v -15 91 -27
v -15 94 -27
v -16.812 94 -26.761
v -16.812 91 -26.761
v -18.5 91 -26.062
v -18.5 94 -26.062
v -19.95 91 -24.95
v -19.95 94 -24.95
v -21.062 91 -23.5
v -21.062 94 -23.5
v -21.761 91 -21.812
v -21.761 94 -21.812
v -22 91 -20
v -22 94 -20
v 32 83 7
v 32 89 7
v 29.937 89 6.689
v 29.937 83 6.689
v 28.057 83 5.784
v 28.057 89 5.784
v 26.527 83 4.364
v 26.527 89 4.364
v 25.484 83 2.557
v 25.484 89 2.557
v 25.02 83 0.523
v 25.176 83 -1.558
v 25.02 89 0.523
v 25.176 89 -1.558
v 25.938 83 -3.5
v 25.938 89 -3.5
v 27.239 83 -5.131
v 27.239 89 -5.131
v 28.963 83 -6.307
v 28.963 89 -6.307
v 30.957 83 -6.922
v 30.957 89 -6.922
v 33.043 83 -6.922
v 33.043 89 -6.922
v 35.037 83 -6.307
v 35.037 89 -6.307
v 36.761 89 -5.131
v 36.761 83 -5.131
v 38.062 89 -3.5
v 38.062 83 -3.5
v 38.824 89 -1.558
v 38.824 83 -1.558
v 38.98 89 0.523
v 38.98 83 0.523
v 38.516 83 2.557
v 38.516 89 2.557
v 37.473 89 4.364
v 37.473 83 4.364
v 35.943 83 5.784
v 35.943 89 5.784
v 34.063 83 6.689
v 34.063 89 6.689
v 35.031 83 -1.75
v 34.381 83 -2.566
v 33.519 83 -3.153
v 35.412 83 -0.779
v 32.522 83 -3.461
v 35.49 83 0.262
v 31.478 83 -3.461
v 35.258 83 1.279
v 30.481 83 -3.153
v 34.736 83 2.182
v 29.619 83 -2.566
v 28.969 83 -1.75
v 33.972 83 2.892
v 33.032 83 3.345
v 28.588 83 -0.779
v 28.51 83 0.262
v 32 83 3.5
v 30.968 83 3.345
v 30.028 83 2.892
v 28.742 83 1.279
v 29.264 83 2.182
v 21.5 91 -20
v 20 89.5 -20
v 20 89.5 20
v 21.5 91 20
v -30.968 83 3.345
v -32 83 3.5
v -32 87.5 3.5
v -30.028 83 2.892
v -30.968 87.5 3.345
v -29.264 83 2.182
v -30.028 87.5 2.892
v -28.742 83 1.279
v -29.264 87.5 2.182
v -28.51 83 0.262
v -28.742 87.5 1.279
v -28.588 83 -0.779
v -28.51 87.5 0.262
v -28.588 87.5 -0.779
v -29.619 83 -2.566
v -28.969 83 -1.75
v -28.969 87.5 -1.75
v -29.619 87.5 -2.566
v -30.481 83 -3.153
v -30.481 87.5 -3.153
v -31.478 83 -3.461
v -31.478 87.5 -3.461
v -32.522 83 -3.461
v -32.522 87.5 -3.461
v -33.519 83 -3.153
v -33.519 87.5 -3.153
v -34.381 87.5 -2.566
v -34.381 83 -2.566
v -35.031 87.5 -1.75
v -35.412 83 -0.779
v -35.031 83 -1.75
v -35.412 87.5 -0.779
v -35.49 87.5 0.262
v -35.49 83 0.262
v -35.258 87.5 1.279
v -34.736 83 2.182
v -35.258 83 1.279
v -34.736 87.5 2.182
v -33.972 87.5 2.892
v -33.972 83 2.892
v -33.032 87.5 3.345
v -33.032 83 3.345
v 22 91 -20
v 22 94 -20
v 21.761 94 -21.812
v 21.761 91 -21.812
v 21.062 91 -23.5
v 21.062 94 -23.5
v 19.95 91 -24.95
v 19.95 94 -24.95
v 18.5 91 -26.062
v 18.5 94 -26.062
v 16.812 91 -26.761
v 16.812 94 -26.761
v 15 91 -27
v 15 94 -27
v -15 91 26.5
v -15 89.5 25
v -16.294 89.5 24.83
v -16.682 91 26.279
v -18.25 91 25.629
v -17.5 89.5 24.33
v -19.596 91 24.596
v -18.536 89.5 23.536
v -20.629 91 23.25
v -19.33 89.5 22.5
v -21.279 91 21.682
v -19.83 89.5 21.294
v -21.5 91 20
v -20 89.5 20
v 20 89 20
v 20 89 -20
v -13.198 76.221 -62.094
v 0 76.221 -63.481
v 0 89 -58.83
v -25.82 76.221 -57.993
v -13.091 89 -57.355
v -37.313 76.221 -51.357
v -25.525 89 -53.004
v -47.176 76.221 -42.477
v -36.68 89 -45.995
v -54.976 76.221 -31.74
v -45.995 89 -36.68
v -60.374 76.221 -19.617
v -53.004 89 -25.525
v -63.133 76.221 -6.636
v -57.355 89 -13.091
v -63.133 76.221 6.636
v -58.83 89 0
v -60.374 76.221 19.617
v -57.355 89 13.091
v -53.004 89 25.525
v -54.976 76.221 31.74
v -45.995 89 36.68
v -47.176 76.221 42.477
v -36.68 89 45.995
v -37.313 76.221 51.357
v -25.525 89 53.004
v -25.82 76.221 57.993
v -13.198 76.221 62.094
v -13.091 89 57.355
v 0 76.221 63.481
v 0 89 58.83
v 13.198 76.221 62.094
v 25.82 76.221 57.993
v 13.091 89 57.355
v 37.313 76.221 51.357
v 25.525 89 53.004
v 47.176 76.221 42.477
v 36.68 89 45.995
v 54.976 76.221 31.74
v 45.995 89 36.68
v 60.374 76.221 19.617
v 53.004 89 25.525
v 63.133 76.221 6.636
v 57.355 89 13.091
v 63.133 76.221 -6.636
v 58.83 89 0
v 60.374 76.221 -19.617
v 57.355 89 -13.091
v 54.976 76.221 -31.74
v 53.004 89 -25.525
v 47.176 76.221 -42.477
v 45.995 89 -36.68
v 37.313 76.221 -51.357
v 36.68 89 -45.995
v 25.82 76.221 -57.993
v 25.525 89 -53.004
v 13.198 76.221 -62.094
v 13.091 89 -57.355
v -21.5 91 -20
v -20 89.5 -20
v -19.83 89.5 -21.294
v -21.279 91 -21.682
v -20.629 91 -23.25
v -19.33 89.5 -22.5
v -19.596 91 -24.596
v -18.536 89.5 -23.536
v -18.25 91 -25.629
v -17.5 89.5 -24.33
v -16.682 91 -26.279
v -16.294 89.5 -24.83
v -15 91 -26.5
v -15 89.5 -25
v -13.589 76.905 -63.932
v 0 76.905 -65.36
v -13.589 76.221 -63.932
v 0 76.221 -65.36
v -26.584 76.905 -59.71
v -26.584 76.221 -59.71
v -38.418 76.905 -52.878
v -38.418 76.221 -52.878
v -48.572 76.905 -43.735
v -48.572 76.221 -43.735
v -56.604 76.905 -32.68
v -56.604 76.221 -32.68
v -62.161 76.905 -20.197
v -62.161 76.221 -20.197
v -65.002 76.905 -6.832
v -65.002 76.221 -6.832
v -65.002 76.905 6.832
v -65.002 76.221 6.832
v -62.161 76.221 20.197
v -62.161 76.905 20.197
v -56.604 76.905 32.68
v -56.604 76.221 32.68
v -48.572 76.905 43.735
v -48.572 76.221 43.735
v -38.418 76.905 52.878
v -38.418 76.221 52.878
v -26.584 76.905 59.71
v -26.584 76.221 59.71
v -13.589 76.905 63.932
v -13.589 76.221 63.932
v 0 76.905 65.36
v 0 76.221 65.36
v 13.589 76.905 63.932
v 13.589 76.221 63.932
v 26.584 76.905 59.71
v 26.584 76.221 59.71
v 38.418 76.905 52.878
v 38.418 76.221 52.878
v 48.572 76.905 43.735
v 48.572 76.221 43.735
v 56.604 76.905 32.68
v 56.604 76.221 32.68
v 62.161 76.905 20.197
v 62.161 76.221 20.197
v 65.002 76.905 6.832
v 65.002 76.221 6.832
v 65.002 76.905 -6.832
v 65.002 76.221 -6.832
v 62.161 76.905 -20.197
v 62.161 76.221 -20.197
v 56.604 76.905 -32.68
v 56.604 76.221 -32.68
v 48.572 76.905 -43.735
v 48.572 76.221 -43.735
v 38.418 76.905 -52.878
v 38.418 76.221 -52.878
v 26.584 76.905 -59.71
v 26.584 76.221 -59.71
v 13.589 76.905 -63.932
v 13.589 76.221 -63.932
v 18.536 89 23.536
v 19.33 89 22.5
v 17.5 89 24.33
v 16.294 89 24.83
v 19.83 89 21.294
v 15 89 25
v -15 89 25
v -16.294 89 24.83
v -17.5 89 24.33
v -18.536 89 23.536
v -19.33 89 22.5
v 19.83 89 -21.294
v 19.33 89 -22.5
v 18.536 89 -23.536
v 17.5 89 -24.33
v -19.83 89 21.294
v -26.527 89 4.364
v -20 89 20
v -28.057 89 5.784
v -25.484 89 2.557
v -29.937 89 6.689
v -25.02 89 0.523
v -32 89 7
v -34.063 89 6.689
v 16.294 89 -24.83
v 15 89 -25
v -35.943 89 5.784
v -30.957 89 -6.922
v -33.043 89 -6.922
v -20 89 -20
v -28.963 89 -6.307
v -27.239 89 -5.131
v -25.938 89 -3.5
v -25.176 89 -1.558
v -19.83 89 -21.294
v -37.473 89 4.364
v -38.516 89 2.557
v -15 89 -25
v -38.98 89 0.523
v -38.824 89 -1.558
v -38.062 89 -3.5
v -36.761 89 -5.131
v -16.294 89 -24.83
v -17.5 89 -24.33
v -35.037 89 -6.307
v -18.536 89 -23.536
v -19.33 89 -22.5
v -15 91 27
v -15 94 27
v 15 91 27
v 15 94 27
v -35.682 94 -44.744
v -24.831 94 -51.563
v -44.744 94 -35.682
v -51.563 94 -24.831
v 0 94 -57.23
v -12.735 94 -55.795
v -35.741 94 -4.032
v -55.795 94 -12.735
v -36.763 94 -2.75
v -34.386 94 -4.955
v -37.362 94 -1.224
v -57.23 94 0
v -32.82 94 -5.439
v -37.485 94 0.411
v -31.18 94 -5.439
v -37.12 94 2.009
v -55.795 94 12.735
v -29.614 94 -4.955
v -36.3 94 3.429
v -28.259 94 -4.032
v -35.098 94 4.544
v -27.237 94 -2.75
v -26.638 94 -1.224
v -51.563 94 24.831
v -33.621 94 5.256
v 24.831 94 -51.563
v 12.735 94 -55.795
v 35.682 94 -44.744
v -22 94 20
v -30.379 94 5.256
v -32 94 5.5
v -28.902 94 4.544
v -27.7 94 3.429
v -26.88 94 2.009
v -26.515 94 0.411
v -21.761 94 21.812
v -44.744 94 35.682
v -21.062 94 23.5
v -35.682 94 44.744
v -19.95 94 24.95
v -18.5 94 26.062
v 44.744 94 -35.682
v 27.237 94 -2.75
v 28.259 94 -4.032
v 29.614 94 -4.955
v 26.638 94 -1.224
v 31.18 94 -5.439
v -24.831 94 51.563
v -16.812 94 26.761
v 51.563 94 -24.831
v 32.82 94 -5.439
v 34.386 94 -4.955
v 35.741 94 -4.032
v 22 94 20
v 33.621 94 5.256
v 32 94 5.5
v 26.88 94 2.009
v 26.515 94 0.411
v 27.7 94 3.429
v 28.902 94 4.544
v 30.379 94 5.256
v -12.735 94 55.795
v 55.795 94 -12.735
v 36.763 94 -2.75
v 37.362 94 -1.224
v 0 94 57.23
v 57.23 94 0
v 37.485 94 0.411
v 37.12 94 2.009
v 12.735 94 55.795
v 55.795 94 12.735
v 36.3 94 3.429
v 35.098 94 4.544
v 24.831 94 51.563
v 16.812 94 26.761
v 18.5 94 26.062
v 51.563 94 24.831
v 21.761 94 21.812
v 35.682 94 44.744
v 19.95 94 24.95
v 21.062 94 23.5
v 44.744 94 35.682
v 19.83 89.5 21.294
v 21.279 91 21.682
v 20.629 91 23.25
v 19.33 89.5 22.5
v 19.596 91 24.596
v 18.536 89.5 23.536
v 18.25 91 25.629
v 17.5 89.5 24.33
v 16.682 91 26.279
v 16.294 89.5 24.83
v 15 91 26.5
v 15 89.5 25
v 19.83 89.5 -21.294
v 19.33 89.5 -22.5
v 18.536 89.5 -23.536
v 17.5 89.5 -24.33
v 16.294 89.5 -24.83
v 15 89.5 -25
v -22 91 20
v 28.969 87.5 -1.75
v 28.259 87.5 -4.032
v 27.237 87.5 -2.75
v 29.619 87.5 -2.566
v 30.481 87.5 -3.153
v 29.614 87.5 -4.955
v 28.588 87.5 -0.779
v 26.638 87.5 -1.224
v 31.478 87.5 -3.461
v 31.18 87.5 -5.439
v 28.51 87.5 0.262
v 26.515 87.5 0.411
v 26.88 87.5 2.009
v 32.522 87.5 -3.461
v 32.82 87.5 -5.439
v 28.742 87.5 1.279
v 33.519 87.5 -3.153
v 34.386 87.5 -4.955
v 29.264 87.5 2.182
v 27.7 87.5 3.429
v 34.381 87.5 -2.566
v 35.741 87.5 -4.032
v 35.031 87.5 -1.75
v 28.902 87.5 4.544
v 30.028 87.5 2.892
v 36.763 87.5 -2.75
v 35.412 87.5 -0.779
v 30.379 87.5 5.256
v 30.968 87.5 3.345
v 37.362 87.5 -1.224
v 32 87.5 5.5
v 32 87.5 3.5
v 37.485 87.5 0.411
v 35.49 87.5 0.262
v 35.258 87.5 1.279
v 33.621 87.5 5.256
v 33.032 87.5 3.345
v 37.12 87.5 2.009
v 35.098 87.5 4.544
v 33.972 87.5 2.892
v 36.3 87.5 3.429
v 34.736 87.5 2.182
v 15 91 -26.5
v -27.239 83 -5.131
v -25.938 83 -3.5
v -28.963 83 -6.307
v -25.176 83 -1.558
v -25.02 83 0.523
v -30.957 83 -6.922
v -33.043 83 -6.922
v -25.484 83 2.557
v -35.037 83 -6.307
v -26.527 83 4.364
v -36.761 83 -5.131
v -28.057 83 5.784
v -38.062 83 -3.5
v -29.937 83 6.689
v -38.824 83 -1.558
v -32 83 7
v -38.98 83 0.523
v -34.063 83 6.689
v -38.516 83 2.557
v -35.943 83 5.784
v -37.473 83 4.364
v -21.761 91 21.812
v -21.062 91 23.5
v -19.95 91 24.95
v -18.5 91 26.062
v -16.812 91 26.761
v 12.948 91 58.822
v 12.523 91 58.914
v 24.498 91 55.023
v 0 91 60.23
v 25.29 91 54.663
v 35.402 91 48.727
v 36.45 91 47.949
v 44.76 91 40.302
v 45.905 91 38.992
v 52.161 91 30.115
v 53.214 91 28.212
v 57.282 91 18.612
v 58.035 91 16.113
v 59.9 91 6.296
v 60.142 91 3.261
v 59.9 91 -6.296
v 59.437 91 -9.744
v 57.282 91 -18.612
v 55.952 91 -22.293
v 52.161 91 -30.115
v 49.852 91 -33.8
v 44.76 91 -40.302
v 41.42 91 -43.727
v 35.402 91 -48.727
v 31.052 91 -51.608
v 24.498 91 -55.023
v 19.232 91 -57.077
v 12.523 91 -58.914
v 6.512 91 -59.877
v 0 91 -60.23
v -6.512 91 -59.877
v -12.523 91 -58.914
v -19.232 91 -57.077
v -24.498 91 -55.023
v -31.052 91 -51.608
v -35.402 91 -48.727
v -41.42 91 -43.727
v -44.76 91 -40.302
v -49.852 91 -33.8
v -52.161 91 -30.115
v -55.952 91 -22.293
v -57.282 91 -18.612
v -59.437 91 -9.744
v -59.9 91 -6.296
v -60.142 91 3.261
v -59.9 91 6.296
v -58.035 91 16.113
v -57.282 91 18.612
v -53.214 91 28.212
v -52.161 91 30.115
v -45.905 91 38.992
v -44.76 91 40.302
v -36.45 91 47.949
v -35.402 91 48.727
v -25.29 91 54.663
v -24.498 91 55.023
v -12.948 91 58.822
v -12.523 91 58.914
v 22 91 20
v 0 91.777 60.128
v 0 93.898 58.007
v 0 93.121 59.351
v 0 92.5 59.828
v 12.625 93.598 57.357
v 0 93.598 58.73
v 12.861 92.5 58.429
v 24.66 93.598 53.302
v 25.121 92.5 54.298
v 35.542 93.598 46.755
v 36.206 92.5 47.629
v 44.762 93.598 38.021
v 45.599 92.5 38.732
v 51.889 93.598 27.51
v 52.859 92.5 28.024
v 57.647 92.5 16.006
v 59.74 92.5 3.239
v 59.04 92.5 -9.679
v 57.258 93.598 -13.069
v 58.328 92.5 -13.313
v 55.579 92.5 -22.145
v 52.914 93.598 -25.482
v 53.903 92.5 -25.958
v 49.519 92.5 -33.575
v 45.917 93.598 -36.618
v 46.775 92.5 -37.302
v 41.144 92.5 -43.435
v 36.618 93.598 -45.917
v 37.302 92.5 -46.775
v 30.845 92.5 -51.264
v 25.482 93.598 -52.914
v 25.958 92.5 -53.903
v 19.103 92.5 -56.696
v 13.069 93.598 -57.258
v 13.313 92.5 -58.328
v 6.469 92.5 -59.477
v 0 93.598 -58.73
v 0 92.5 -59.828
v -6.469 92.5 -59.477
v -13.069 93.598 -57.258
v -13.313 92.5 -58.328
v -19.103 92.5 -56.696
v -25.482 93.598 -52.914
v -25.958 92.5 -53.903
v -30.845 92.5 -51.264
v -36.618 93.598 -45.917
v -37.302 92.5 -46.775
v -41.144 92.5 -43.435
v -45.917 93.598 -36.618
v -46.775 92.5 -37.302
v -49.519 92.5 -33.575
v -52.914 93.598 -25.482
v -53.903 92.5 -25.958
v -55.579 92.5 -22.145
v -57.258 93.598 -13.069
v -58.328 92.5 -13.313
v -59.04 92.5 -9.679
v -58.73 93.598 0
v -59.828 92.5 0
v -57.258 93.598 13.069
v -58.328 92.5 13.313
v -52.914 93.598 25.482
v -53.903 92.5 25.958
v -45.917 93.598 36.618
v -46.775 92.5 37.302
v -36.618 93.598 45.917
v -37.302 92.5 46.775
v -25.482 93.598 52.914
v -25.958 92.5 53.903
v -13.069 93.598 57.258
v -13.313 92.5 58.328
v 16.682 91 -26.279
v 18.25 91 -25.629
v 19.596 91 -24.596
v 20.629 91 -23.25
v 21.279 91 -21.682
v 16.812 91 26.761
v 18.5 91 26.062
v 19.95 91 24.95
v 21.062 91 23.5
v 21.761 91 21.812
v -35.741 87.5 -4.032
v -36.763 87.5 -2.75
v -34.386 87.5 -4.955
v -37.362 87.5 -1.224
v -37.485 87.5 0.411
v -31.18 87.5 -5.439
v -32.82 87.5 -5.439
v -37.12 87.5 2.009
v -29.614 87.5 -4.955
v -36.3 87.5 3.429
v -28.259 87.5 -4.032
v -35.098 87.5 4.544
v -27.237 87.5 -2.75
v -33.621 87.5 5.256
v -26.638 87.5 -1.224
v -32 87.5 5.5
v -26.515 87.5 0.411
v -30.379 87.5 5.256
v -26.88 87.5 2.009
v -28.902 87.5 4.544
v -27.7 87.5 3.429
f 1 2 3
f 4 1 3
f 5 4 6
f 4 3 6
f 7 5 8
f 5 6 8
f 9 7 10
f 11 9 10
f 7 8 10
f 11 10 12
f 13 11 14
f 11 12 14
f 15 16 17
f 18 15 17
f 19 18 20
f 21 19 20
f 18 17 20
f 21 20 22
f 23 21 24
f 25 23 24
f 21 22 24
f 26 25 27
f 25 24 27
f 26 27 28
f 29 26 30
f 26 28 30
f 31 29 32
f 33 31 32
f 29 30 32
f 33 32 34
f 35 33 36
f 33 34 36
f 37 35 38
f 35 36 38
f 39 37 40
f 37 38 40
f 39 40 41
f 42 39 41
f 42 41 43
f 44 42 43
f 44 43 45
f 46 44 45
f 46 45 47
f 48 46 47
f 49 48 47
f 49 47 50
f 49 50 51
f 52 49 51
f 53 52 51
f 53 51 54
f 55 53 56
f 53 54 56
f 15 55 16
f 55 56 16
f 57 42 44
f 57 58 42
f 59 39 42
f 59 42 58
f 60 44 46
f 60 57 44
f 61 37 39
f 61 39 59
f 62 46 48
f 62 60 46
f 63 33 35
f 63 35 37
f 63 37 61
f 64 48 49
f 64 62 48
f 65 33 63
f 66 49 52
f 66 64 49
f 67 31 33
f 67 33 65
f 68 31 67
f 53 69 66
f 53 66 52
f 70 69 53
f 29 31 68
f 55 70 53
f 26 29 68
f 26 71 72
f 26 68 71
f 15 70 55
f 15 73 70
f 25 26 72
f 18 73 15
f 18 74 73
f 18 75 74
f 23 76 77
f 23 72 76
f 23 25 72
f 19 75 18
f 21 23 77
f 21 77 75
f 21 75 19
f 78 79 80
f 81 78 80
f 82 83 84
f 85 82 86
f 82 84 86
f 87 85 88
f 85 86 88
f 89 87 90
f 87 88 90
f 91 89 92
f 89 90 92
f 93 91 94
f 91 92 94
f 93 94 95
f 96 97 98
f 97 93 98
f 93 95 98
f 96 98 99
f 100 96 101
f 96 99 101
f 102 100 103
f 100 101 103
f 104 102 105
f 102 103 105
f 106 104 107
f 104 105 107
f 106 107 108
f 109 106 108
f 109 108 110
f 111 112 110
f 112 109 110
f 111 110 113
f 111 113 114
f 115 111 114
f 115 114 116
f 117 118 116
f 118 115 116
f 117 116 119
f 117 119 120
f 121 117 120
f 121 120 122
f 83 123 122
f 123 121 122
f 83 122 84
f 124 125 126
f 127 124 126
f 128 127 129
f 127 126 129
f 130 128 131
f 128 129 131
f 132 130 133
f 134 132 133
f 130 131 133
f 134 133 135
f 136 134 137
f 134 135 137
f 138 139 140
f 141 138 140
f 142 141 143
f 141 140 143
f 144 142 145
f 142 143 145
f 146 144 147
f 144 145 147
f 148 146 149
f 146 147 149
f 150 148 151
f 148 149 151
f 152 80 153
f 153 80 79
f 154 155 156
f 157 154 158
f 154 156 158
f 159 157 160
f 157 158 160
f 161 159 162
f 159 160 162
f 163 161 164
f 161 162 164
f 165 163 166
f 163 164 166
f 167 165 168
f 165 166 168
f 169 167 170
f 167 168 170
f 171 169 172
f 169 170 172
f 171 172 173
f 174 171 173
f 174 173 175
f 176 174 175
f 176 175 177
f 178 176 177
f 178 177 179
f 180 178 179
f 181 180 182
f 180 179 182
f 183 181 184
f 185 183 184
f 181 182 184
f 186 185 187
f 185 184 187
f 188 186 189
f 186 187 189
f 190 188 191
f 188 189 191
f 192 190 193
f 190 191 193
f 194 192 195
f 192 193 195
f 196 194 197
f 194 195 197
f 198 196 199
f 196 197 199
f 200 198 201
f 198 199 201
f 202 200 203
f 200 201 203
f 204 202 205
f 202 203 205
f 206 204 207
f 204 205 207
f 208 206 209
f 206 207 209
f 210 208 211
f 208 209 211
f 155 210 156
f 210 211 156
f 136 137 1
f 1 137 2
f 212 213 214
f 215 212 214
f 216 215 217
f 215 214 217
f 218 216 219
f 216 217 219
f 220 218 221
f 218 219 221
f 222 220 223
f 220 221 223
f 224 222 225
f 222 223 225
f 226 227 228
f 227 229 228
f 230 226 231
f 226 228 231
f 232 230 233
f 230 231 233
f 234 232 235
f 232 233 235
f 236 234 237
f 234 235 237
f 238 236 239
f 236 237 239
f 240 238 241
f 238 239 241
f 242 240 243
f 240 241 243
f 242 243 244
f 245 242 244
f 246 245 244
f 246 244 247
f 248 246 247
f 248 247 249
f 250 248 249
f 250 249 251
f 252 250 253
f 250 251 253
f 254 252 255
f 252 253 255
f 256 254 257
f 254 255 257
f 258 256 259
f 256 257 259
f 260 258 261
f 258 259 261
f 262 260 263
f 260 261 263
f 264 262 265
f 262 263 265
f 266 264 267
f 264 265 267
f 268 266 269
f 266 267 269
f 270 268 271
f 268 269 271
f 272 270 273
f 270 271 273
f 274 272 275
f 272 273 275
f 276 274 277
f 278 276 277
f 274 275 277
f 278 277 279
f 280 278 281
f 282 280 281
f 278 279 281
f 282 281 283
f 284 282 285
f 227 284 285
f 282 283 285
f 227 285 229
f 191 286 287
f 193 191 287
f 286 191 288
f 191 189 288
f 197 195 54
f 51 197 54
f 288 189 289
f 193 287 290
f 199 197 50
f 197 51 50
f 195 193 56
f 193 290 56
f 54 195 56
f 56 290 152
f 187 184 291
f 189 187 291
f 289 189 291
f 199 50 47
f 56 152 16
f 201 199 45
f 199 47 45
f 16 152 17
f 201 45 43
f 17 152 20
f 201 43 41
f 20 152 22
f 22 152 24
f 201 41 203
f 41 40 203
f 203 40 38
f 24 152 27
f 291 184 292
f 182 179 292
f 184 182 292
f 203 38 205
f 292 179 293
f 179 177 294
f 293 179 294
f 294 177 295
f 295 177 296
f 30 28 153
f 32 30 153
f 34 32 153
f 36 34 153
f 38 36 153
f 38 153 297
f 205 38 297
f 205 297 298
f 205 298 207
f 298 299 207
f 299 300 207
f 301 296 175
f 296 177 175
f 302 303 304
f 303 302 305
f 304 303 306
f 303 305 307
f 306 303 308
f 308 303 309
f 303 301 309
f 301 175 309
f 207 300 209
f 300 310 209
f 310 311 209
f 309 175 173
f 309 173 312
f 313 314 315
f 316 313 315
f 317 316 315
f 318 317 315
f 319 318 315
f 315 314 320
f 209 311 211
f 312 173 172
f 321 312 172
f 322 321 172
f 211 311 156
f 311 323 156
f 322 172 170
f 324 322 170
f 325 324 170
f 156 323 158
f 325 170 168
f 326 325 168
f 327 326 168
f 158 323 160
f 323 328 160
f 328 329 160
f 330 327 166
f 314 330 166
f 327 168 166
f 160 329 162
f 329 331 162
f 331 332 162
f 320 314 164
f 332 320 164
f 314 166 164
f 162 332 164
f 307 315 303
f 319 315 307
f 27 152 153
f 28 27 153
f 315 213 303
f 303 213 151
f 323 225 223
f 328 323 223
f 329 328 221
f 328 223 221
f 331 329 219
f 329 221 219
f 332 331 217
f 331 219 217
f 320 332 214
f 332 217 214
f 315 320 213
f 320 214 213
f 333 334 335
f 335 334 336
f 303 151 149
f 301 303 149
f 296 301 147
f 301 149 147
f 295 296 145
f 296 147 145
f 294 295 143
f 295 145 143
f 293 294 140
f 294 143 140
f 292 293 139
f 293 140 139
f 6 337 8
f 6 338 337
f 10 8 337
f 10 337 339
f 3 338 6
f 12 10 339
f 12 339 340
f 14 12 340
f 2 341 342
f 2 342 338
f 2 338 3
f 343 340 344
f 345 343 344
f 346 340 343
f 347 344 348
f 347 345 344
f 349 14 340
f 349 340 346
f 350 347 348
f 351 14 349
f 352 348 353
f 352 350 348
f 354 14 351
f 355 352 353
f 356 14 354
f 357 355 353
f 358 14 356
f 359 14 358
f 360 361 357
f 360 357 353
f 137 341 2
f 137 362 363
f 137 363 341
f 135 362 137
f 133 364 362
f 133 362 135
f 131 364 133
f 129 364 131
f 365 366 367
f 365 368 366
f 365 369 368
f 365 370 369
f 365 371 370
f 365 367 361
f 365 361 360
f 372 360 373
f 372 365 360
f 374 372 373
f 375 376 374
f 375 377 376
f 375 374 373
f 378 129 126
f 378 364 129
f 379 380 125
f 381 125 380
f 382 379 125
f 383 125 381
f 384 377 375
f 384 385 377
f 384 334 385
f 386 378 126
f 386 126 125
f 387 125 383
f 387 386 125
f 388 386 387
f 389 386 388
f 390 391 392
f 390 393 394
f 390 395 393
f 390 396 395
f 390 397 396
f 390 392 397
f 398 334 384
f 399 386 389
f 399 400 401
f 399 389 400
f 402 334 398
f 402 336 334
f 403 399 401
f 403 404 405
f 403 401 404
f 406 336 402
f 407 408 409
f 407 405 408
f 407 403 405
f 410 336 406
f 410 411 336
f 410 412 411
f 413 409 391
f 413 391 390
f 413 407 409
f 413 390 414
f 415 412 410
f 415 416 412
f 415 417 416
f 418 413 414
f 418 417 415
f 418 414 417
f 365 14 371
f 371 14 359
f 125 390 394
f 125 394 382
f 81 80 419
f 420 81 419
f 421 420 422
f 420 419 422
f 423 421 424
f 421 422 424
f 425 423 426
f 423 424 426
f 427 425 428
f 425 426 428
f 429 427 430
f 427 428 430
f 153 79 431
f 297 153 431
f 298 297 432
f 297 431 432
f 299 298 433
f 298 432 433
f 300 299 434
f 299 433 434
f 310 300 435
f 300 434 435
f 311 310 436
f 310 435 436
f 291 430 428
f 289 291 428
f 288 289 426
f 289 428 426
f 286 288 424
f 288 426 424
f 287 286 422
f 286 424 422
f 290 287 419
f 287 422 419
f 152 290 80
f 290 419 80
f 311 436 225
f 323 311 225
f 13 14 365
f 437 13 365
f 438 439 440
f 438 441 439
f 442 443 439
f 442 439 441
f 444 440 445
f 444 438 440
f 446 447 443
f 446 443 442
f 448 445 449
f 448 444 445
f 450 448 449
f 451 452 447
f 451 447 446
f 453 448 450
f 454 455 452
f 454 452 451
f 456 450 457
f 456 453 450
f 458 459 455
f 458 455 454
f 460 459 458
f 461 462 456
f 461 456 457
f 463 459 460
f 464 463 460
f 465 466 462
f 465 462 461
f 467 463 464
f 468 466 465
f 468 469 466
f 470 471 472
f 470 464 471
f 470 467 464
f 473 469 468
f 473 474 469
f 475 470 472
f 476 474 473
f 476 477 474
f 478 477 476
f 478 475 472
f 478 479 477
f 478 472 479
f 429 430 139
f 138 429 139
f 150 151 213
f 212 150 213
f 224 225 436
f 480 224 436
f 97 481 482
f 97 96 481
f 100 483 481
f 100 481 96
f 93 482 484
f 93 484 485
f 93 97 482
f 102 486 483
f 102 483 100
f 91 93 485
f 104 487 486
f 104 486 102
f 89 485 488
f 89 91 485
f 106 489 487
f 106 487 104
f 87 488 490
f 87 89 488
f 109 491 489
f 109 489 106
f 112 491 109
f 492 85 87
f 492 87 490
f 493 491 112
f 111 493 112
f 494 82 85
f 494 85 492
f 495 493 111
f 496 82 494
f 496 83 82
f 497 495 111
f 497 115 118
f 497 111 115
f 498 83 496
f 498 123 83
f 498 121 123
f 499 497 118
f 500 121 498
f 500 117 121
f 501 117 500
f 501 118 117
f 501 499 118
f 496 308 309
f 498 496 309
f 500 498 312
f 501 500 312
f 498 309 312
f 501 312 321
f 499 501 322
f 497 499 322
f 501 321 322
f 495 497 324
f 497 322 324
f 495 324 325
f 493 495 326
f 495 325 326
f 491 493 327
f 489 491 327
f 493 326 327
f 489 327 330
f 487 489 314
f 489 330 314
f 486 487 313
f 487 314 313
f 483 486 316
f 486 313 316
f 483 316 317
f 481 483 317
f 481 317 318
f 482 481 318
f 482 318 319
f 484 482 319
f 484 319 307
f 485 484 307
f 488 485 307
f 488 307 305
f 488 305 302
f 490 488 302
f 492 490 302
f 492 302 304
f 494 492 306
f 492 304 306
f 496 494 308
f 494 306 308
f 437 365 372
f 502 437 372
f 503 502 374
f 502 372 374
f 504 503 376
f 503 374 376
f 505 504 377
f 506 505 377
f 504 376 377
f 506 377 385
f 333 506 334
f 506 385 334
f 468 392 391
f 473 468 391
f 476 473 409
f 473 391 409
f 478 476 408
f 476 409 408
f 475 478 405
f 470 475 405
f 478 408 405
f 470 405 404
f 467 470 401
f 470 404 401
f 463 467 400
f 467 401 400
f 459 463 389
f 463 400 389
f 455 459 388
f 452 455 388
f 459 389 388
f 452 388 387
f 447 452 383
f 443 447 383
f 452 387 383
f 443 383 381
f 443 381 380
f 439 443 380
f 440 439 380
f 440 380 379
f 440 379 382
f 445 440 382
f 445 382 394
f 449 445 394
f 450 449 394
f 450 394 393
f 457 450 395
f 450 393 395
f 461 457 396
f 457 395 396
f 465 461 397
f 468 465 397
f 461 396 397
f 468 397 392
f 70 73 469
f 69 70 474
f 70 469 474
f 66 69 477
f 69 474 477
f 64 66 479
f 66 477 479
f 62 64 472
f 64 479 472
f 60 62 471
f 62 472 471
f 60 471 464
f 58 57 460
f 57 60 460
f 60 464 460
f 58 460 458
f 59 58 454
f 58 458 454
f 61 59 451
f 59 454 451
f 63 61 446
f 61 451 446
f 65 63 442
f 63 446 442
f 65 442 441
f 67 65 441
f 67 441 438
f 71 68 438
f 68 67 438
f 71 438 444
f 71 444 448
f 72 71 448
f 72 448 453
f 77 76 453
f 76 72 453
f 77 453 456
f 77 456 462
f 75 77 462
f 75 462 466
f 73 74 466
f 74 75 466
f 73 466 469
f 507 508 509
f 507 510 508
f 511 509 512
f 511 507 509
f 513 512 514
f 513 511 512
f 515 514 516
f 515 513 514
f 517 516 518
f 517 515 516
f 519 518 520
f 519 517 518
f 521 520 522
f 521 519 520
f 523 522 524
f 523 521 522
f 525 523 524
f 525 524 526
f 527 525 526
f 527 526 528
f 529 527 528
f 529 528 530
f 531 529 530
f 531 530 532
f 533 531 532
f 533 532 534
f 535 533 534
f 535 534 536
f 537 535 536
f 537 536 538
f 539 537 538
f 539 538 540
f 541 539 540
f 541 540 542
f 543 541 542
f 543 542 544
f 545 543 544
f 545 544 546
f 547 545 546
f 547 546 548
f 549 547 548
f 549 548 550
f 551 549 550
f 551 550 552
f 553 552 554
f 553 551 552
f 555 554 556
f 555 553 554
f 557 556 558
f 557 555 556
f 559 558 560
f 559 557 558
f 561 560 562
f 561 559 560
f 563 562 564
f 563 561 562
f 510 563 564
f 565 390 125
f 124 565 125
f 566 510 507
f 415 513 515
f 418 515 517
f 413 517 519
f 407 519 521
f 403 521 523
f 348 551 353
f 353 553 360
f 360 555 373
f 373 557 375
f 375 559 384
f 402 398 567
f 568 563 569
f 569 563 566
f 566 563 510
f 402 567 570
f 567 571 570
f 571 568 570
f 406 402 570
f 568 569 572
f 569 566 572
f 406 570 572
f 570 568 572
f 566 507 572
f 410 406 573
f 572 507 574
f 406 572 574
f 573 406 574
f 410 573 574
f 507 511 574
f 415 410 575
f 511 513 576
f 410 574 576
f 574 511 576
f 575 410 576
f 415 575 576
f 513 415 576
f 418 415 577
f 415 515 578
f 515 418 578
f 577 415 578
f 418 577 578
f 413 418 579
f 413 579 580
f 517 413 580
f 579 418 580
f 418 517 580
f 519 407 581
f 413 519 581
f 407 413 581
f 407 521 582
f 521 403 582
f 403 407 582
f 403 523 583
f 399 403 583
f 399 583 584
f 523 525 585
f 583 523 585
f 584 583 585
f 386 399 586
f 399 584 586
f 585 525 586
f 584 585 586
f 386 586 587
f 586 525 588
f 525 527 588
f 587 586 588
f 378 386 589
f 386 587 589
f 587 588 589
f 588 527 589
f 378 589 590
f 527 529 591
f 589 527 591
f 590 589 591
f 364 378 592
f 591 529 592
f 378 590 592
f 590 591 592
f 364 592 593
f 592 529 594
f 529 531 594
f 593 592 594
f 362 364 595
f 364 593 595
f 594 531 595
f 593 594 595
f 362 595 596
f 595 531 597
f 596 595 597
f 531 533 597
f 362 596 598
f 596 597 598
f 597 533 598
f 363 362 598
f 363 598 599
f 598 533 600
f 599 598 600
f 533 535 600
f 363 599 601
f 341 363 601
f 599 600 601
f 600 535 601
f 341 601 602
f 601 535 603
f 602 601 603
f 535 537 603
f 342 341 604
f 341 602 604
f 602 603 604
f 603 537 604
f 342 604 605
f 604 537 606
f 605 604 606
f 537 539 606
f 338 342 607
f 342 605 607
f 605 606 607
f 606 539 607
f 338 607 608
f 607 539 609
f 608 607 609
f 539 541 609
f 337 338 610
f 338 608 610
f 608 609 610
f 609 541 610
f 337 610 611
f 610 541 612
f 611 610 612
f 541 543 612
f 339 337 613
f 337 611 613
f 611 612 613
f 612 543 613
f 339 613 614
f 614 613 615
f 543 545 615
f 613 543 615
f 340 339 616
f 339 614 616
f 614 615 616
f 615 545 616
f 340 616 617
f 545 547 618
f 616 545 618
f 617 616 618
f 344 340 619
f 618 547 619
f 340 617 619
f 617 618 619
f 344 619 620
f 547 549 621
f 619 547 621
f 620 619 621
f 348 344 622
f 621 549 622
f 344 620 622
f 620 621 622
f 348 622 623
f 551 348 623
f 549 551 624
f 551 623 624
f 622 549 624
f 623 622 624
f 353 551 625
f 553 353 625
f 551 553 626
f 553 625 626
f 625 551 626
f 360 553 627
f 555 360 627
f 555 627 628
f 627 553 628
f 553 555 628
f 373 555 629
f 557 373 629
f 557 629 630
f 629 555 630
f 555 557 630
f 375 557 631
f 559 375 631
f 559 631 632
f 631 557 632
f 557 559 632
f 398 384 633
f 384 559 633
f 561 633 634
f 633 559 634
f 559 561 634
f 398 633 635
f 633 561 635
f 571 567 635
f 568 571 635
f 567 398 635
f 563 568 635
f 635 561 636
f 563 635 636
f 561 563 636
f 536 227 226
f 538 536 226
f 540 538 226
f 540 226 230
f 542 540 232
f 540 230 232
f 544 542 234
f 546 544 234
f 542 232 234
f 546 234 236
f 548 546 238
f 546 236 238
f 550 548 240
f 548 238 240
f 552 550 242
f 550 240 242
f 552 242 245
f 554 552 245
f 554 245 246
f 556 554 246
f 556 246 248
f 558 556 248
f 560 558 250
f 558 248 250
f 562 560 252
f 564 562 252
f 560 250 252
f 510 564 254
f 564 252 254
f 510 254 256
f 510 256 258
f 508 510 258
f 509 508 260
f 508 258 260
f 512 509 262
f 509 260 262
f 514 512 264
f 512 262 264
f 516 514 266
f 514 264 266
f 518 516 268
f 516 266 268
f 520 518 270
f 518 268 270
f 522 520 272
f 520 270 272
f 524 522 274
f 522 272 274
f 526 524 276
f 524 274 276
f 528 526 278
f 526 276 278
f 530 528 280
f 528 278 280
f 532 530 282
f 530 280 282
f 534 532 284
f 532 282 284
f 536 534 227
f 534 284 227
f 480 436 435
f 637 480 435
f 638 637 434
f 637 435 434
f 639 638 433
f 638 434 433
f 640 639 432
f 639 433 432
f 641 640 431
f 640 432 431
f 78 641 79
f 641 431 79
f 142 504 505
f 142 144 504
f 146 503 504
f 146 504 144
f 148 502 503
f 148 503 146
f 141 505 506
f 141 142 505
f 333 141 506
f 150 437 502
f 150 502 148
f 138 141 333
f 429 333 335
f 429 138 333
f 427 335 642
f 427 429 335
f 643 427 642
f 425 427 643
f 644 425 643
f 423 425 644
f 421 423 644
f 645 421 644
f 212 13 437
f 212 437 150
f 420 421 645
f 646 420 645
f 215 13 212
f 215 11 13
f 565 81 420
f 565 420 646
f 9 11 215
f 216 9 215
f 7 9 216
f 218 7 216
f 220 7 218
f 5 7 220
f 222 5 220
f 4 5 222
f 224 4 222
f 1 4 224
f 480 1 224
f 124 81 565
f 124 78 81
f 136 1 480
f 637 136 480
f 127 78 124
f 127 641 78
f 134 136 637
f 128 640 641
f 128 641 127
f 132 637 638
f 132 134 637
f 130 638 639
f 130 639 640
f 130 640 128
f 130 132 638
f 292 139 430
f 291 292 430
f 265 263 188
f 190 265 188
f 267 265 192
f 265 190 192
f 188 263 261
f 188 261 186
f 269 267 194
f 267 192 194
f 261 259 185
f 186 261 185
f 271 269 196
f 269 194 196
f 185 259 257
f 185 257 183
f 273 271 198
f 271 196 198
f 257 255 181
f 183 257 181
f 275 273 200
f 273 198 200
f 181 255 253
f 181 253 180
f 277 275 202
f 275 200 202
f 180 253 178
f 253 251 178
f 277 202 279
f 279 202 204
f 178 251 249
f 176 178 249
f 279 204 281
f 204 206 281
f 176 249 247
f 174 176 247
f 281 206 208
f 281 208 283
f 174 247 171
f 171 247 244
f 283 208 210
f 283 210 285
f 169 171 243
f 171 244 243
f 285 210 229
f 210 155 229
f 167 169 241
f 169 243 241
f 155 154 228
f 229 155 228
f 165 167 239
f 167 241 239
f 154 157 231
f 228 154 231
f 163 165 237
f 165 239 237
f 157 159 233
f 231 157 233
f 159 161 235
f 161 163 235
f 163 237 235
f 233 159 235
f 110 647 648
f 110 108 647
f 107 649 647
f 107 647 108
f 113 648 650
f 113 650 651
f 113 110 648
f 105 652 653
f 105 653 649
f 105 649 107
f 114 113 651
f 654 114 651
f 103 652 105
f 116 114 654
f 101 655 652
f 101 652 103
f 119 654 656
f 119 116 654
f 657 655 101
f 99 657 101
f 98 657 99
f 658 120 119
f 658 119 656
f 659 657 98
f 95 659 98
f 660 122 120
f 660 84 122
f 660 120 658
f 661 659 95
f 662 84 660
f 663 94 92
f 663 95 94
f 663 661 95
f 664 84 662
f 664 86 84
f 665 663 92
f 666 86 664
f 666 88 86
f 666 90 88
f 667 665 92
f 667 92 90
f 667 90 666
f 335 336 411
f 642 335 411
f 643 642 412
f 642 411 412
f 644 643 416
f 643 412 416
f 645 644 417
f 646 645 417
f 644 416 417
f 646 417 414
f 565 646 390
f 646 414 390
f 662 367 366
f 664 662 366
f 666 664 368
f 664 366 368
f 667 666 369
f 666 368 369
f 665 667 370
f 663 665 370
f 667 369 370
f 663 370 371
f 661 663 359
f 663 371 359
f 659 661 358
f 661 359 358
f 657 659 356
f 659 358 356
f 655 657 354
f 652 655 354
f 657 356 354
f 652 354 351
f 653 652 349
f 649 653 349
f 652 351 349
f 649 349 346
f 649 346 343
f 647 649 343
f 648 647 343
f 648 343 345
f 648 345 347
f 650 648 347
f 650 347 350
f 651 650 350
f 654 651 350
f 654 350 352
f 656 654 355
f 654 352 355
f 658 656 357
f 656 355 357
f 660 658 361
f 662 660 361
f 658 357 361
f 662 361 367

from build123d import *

# Parameters (mm, degrees)
CORTAR_EXTRUIR1_REACH   = 95.608
CROQUIS2_R              = 3.5
CROQUIS3_R              = 7
CROQUIS3_R_2            = 3.5
SALIENTE_EXTRUIR1_DEPTH = 6
SALIENTE_EXTRUIR2_START = 3
CROQUIS4_R              = 60.229990605
CROQUIS4_R_2            = 3.5
SALIENTE_EXTRUIR2_DEPTH = 3
CROQUIS5_R              = 5.5
CORTAR_EXTRUIR2_DEPTH   = 6.5
CORTAR_EXTRUIR3_REACH   = 96.128
CORTAR_EXTRUIR4_DEPTH   = 3
CHAFL_N1_SIZE           = 1.5
REDONDEO1_R             = 3


with BuildPart() as part:
    # Croquis1 → Revolución1 (revolve)
    with BuildSketch(Plane.XY, mode=Mode.PRIVATE) as revoluci_n1_sk:
        Polygon((-65.360292755, 76.904610688), (-65.360292755, 76.220570402), (-63.480907514, 76.220570402), (-58.829575529, 89), (0, 89), (0, 91), (-60.229990605, 91), align=None)
    revolve(revoluci_n1_sk.sketch.rotate(Axis((0, 89, 0), (0, 1, 0)), 270), axis=Axis((0, 89, 0), (0, 1, 0)))

    # Croquis2 → Cortar-Extruir1 (cut, up to next)
    with BuildSketch(Plane(origin=(0, 91, 0), x_dir=(1, 0, 0), z_dir=(0, 1, 0)), mode=Mode.PRIVATE) as cortar_extruir1_sk1:
        with Locations(Location((32, 0, 0), (0, 0, 270))):
            Circle(CROQUIS2_R)
    cortar_extruir1_tool1 = extrude(cortar_extruir1_sk1.sketch, amount=-CORTAR_EXTRUIR1_REACH, mode=Mode.PRIVATE) & part.part
    # Croquis2 → Cortar-Extruir1 (cut, up to next)
    with BuildSketch(Plane(origin=(0, 91, 0), x_dir=(1, 0, 0), z_dir=(0, 1, 0)), mode=Mode.PRIVATE) as cortar_extruir1_sk2:
        with Locations(Location((-32, 0, 0), (0, 0, 270))):
            Circle(CROQUIS2_R)
    cortar_extruir1_tool2 = extrude(cortar_extruir1_sk2.sketch, amount=-CORTAR_EXTRUIR1_REACH, mode=Mode.PRIVATE) & part.part
    add(cortar_extruir1_tool1.solids().sort_by_distance((32, 91, 0))[0], mode=Mode.SUBTRACT)
    add(cortar_extruir1_tool2.solids().sort_by_distance((-32, 91, 0))[0], mode=Mode.SUBTRACT)

    # Croquis3 → Saliente-Extruir1 (add)
    # profile 1 of 2: a face of its own
    with BuildSketch(Plane.XZ.offset(-89)):
        with Locations(Location((-32, 0, 0), (0, 0, 90))):
            Circle(CROQUIS3_R)
        with Locations(Location((-32, 0, 0), (0, 0, 90))):
            Circle(CROQUIS3_R_2, mode=Mode.SUBTRACT)
    # profile 2 of 2: a face of its own
    with BuildSketch(Plane.XZ.offset(-89)):
        with Locations(Location((32, 0, 0), (0, 0, 90))):
            Circle(CROQUIS3_R)
        with Locations(Location((32, 0, 0), (0, 0, 90))):
            Circle(CROQUIS3_R_2, mode=Mode.SUBTRACT)
    extrude(amount=SALIENTE_EXTRUIR1_DEPTH)

    # Croquis4 → Saliente-Extruir2 (add)
    with BuildSketch(Plane(origin=(0, 91, 0), x_dir=(1, 0, 0), z_dir=(0, 1, 0)).offset(SALIENTE_EXTRUIR2_START)):
        with Locations(Location((0, 0, 0), (0, 0, 270))):
            Circle(CROQUIS4_R)
        with Locations(Location((32, 0, 0), (0, 0, 270))):
            Circle(CROQUIS4_R_2, mode=Mode.SUBTRACT)
        with Locations(Location((-32, 0, 0), (0, 0, 270))):
            Circle(CROQUIS4_R_2, mode=Mode.SUBTRACT)
    extrude(amount=-SALIENTE_EXTRUIR2_DEPTH)

    # Croquis5 → Cortar-Extruir2 (cut)
    with BuildSketch(Plane(origin=(0, 94, 0), x_dir=(1, 0, 0), z_dir=(0, 1, 0))):
        with Locations(Location((-32, 0, 0), (0, 0, 270))):
            Circle(CROQUIS5_R)
        with Locations(Location((32, 0, 0), (0, 0, 270))):
            Circle(CROQUIS5_R)
    extrude(amount=-CORTAR_EXTRUIR2_DEPTH, mode=Mode.SUBTRACT)

    # Croquis6 → Cortar-Extruir3 (cut, up to next)
    with BuildSketch(Plane(origin=(0, 94, 0), x_dir=(1, 0, 0), z_dir=(0, 1, 0)), mode=Mode.PRIVATE) as cortar_extruir3_sk1:
        with BuildLine():
            Line((-15, -25), (15, -25))
            ThreePointArc((15, -25), (18.535533906, -23.535533906), (20, -20))
            Line((20, -20), (20, 20))
            ThreePointArc((20, 20), (18.535533906, 23.535533906), (15, 25))
            Line((15, 25), (-15, 25))
            ThreePointArc((-15, 25), (-18.535533906, 23.535533906), (-20, 20))
            Line((-20, 20), (-20, -20))
            ThreePointArc((-20, -20), (-18.535533906, -23.535533906), (-15, -25))
        make_face()
    cortar_extruir3_tool1 = extrude(cortar_extruir3_sk1.sketch, amount=-CORTAR_EXTRUIR3_REACH, mode=Mode.PRIVATE) & part.part
    add(cortar_extruir3_tool1.solids().sort_by_distance((0, 94, 0))[0], mode=Mode.SUBTRACT)

    # Croquis7 → Cortar-Extruir4 (cut)
    with BuildSketch(Plane(origin=(0, 94, 0), x_dir=(1, 0, 0), z_dir=(0, 1, 0))):
        with BuildLine():
            Line((-15, -27), (15, -27))
            ThreePointArc((15, -27), (19.949747468, -24.949747468), (22, -20))
            Line((22, -20), (22, 20))
            ThreePointArc((22, 20), (19.949747468, 24.949747468), (15, 27))
            Line((15, 27), (-15, 27))
            ThreePointArc((-15, 27), (-19.949747468, 24.949747468), (-22, 20))
            Line((-22, 20), (-22, -20))
            ThreePointArc((-22, -20), (-19.949747468, -24.949747468), (-15, -27))
        make_face()
    extrude(amount=-CORTAR_EXTRUIR4_DEPTH, mode=Mode.SUBTRACT)

    # Chaflán1
    chafl_n1_edges = [part.edges().sort_by_distance(p)[0] for p in [
        (0, 91, 25),
        (-18.535533906, 91, 23.535533906),
        (-20, 91, 0),
        (-18.535533906, 91, -23.535533906),
        (0, 91, -25),
        (18.535533906, 91, -23.535533906),
        (20, 91, 0),
        (18.535533906, 91, 23.535533906),
    ]]
    chamfer(chafl_n1_edges, length=CHAFL_N1_SIZE)

    # Redondeo1
    redondeo1_edges = [part.edges().sort_by_distance(p)[0] for p in [
        (0, 94, -60.229990605),
    ]]
    fillet(redondeo1_edges, radius=REDONDEO1_R - 0.0001)  # a hair under: the kernel refuses the full size


solid = part.part
